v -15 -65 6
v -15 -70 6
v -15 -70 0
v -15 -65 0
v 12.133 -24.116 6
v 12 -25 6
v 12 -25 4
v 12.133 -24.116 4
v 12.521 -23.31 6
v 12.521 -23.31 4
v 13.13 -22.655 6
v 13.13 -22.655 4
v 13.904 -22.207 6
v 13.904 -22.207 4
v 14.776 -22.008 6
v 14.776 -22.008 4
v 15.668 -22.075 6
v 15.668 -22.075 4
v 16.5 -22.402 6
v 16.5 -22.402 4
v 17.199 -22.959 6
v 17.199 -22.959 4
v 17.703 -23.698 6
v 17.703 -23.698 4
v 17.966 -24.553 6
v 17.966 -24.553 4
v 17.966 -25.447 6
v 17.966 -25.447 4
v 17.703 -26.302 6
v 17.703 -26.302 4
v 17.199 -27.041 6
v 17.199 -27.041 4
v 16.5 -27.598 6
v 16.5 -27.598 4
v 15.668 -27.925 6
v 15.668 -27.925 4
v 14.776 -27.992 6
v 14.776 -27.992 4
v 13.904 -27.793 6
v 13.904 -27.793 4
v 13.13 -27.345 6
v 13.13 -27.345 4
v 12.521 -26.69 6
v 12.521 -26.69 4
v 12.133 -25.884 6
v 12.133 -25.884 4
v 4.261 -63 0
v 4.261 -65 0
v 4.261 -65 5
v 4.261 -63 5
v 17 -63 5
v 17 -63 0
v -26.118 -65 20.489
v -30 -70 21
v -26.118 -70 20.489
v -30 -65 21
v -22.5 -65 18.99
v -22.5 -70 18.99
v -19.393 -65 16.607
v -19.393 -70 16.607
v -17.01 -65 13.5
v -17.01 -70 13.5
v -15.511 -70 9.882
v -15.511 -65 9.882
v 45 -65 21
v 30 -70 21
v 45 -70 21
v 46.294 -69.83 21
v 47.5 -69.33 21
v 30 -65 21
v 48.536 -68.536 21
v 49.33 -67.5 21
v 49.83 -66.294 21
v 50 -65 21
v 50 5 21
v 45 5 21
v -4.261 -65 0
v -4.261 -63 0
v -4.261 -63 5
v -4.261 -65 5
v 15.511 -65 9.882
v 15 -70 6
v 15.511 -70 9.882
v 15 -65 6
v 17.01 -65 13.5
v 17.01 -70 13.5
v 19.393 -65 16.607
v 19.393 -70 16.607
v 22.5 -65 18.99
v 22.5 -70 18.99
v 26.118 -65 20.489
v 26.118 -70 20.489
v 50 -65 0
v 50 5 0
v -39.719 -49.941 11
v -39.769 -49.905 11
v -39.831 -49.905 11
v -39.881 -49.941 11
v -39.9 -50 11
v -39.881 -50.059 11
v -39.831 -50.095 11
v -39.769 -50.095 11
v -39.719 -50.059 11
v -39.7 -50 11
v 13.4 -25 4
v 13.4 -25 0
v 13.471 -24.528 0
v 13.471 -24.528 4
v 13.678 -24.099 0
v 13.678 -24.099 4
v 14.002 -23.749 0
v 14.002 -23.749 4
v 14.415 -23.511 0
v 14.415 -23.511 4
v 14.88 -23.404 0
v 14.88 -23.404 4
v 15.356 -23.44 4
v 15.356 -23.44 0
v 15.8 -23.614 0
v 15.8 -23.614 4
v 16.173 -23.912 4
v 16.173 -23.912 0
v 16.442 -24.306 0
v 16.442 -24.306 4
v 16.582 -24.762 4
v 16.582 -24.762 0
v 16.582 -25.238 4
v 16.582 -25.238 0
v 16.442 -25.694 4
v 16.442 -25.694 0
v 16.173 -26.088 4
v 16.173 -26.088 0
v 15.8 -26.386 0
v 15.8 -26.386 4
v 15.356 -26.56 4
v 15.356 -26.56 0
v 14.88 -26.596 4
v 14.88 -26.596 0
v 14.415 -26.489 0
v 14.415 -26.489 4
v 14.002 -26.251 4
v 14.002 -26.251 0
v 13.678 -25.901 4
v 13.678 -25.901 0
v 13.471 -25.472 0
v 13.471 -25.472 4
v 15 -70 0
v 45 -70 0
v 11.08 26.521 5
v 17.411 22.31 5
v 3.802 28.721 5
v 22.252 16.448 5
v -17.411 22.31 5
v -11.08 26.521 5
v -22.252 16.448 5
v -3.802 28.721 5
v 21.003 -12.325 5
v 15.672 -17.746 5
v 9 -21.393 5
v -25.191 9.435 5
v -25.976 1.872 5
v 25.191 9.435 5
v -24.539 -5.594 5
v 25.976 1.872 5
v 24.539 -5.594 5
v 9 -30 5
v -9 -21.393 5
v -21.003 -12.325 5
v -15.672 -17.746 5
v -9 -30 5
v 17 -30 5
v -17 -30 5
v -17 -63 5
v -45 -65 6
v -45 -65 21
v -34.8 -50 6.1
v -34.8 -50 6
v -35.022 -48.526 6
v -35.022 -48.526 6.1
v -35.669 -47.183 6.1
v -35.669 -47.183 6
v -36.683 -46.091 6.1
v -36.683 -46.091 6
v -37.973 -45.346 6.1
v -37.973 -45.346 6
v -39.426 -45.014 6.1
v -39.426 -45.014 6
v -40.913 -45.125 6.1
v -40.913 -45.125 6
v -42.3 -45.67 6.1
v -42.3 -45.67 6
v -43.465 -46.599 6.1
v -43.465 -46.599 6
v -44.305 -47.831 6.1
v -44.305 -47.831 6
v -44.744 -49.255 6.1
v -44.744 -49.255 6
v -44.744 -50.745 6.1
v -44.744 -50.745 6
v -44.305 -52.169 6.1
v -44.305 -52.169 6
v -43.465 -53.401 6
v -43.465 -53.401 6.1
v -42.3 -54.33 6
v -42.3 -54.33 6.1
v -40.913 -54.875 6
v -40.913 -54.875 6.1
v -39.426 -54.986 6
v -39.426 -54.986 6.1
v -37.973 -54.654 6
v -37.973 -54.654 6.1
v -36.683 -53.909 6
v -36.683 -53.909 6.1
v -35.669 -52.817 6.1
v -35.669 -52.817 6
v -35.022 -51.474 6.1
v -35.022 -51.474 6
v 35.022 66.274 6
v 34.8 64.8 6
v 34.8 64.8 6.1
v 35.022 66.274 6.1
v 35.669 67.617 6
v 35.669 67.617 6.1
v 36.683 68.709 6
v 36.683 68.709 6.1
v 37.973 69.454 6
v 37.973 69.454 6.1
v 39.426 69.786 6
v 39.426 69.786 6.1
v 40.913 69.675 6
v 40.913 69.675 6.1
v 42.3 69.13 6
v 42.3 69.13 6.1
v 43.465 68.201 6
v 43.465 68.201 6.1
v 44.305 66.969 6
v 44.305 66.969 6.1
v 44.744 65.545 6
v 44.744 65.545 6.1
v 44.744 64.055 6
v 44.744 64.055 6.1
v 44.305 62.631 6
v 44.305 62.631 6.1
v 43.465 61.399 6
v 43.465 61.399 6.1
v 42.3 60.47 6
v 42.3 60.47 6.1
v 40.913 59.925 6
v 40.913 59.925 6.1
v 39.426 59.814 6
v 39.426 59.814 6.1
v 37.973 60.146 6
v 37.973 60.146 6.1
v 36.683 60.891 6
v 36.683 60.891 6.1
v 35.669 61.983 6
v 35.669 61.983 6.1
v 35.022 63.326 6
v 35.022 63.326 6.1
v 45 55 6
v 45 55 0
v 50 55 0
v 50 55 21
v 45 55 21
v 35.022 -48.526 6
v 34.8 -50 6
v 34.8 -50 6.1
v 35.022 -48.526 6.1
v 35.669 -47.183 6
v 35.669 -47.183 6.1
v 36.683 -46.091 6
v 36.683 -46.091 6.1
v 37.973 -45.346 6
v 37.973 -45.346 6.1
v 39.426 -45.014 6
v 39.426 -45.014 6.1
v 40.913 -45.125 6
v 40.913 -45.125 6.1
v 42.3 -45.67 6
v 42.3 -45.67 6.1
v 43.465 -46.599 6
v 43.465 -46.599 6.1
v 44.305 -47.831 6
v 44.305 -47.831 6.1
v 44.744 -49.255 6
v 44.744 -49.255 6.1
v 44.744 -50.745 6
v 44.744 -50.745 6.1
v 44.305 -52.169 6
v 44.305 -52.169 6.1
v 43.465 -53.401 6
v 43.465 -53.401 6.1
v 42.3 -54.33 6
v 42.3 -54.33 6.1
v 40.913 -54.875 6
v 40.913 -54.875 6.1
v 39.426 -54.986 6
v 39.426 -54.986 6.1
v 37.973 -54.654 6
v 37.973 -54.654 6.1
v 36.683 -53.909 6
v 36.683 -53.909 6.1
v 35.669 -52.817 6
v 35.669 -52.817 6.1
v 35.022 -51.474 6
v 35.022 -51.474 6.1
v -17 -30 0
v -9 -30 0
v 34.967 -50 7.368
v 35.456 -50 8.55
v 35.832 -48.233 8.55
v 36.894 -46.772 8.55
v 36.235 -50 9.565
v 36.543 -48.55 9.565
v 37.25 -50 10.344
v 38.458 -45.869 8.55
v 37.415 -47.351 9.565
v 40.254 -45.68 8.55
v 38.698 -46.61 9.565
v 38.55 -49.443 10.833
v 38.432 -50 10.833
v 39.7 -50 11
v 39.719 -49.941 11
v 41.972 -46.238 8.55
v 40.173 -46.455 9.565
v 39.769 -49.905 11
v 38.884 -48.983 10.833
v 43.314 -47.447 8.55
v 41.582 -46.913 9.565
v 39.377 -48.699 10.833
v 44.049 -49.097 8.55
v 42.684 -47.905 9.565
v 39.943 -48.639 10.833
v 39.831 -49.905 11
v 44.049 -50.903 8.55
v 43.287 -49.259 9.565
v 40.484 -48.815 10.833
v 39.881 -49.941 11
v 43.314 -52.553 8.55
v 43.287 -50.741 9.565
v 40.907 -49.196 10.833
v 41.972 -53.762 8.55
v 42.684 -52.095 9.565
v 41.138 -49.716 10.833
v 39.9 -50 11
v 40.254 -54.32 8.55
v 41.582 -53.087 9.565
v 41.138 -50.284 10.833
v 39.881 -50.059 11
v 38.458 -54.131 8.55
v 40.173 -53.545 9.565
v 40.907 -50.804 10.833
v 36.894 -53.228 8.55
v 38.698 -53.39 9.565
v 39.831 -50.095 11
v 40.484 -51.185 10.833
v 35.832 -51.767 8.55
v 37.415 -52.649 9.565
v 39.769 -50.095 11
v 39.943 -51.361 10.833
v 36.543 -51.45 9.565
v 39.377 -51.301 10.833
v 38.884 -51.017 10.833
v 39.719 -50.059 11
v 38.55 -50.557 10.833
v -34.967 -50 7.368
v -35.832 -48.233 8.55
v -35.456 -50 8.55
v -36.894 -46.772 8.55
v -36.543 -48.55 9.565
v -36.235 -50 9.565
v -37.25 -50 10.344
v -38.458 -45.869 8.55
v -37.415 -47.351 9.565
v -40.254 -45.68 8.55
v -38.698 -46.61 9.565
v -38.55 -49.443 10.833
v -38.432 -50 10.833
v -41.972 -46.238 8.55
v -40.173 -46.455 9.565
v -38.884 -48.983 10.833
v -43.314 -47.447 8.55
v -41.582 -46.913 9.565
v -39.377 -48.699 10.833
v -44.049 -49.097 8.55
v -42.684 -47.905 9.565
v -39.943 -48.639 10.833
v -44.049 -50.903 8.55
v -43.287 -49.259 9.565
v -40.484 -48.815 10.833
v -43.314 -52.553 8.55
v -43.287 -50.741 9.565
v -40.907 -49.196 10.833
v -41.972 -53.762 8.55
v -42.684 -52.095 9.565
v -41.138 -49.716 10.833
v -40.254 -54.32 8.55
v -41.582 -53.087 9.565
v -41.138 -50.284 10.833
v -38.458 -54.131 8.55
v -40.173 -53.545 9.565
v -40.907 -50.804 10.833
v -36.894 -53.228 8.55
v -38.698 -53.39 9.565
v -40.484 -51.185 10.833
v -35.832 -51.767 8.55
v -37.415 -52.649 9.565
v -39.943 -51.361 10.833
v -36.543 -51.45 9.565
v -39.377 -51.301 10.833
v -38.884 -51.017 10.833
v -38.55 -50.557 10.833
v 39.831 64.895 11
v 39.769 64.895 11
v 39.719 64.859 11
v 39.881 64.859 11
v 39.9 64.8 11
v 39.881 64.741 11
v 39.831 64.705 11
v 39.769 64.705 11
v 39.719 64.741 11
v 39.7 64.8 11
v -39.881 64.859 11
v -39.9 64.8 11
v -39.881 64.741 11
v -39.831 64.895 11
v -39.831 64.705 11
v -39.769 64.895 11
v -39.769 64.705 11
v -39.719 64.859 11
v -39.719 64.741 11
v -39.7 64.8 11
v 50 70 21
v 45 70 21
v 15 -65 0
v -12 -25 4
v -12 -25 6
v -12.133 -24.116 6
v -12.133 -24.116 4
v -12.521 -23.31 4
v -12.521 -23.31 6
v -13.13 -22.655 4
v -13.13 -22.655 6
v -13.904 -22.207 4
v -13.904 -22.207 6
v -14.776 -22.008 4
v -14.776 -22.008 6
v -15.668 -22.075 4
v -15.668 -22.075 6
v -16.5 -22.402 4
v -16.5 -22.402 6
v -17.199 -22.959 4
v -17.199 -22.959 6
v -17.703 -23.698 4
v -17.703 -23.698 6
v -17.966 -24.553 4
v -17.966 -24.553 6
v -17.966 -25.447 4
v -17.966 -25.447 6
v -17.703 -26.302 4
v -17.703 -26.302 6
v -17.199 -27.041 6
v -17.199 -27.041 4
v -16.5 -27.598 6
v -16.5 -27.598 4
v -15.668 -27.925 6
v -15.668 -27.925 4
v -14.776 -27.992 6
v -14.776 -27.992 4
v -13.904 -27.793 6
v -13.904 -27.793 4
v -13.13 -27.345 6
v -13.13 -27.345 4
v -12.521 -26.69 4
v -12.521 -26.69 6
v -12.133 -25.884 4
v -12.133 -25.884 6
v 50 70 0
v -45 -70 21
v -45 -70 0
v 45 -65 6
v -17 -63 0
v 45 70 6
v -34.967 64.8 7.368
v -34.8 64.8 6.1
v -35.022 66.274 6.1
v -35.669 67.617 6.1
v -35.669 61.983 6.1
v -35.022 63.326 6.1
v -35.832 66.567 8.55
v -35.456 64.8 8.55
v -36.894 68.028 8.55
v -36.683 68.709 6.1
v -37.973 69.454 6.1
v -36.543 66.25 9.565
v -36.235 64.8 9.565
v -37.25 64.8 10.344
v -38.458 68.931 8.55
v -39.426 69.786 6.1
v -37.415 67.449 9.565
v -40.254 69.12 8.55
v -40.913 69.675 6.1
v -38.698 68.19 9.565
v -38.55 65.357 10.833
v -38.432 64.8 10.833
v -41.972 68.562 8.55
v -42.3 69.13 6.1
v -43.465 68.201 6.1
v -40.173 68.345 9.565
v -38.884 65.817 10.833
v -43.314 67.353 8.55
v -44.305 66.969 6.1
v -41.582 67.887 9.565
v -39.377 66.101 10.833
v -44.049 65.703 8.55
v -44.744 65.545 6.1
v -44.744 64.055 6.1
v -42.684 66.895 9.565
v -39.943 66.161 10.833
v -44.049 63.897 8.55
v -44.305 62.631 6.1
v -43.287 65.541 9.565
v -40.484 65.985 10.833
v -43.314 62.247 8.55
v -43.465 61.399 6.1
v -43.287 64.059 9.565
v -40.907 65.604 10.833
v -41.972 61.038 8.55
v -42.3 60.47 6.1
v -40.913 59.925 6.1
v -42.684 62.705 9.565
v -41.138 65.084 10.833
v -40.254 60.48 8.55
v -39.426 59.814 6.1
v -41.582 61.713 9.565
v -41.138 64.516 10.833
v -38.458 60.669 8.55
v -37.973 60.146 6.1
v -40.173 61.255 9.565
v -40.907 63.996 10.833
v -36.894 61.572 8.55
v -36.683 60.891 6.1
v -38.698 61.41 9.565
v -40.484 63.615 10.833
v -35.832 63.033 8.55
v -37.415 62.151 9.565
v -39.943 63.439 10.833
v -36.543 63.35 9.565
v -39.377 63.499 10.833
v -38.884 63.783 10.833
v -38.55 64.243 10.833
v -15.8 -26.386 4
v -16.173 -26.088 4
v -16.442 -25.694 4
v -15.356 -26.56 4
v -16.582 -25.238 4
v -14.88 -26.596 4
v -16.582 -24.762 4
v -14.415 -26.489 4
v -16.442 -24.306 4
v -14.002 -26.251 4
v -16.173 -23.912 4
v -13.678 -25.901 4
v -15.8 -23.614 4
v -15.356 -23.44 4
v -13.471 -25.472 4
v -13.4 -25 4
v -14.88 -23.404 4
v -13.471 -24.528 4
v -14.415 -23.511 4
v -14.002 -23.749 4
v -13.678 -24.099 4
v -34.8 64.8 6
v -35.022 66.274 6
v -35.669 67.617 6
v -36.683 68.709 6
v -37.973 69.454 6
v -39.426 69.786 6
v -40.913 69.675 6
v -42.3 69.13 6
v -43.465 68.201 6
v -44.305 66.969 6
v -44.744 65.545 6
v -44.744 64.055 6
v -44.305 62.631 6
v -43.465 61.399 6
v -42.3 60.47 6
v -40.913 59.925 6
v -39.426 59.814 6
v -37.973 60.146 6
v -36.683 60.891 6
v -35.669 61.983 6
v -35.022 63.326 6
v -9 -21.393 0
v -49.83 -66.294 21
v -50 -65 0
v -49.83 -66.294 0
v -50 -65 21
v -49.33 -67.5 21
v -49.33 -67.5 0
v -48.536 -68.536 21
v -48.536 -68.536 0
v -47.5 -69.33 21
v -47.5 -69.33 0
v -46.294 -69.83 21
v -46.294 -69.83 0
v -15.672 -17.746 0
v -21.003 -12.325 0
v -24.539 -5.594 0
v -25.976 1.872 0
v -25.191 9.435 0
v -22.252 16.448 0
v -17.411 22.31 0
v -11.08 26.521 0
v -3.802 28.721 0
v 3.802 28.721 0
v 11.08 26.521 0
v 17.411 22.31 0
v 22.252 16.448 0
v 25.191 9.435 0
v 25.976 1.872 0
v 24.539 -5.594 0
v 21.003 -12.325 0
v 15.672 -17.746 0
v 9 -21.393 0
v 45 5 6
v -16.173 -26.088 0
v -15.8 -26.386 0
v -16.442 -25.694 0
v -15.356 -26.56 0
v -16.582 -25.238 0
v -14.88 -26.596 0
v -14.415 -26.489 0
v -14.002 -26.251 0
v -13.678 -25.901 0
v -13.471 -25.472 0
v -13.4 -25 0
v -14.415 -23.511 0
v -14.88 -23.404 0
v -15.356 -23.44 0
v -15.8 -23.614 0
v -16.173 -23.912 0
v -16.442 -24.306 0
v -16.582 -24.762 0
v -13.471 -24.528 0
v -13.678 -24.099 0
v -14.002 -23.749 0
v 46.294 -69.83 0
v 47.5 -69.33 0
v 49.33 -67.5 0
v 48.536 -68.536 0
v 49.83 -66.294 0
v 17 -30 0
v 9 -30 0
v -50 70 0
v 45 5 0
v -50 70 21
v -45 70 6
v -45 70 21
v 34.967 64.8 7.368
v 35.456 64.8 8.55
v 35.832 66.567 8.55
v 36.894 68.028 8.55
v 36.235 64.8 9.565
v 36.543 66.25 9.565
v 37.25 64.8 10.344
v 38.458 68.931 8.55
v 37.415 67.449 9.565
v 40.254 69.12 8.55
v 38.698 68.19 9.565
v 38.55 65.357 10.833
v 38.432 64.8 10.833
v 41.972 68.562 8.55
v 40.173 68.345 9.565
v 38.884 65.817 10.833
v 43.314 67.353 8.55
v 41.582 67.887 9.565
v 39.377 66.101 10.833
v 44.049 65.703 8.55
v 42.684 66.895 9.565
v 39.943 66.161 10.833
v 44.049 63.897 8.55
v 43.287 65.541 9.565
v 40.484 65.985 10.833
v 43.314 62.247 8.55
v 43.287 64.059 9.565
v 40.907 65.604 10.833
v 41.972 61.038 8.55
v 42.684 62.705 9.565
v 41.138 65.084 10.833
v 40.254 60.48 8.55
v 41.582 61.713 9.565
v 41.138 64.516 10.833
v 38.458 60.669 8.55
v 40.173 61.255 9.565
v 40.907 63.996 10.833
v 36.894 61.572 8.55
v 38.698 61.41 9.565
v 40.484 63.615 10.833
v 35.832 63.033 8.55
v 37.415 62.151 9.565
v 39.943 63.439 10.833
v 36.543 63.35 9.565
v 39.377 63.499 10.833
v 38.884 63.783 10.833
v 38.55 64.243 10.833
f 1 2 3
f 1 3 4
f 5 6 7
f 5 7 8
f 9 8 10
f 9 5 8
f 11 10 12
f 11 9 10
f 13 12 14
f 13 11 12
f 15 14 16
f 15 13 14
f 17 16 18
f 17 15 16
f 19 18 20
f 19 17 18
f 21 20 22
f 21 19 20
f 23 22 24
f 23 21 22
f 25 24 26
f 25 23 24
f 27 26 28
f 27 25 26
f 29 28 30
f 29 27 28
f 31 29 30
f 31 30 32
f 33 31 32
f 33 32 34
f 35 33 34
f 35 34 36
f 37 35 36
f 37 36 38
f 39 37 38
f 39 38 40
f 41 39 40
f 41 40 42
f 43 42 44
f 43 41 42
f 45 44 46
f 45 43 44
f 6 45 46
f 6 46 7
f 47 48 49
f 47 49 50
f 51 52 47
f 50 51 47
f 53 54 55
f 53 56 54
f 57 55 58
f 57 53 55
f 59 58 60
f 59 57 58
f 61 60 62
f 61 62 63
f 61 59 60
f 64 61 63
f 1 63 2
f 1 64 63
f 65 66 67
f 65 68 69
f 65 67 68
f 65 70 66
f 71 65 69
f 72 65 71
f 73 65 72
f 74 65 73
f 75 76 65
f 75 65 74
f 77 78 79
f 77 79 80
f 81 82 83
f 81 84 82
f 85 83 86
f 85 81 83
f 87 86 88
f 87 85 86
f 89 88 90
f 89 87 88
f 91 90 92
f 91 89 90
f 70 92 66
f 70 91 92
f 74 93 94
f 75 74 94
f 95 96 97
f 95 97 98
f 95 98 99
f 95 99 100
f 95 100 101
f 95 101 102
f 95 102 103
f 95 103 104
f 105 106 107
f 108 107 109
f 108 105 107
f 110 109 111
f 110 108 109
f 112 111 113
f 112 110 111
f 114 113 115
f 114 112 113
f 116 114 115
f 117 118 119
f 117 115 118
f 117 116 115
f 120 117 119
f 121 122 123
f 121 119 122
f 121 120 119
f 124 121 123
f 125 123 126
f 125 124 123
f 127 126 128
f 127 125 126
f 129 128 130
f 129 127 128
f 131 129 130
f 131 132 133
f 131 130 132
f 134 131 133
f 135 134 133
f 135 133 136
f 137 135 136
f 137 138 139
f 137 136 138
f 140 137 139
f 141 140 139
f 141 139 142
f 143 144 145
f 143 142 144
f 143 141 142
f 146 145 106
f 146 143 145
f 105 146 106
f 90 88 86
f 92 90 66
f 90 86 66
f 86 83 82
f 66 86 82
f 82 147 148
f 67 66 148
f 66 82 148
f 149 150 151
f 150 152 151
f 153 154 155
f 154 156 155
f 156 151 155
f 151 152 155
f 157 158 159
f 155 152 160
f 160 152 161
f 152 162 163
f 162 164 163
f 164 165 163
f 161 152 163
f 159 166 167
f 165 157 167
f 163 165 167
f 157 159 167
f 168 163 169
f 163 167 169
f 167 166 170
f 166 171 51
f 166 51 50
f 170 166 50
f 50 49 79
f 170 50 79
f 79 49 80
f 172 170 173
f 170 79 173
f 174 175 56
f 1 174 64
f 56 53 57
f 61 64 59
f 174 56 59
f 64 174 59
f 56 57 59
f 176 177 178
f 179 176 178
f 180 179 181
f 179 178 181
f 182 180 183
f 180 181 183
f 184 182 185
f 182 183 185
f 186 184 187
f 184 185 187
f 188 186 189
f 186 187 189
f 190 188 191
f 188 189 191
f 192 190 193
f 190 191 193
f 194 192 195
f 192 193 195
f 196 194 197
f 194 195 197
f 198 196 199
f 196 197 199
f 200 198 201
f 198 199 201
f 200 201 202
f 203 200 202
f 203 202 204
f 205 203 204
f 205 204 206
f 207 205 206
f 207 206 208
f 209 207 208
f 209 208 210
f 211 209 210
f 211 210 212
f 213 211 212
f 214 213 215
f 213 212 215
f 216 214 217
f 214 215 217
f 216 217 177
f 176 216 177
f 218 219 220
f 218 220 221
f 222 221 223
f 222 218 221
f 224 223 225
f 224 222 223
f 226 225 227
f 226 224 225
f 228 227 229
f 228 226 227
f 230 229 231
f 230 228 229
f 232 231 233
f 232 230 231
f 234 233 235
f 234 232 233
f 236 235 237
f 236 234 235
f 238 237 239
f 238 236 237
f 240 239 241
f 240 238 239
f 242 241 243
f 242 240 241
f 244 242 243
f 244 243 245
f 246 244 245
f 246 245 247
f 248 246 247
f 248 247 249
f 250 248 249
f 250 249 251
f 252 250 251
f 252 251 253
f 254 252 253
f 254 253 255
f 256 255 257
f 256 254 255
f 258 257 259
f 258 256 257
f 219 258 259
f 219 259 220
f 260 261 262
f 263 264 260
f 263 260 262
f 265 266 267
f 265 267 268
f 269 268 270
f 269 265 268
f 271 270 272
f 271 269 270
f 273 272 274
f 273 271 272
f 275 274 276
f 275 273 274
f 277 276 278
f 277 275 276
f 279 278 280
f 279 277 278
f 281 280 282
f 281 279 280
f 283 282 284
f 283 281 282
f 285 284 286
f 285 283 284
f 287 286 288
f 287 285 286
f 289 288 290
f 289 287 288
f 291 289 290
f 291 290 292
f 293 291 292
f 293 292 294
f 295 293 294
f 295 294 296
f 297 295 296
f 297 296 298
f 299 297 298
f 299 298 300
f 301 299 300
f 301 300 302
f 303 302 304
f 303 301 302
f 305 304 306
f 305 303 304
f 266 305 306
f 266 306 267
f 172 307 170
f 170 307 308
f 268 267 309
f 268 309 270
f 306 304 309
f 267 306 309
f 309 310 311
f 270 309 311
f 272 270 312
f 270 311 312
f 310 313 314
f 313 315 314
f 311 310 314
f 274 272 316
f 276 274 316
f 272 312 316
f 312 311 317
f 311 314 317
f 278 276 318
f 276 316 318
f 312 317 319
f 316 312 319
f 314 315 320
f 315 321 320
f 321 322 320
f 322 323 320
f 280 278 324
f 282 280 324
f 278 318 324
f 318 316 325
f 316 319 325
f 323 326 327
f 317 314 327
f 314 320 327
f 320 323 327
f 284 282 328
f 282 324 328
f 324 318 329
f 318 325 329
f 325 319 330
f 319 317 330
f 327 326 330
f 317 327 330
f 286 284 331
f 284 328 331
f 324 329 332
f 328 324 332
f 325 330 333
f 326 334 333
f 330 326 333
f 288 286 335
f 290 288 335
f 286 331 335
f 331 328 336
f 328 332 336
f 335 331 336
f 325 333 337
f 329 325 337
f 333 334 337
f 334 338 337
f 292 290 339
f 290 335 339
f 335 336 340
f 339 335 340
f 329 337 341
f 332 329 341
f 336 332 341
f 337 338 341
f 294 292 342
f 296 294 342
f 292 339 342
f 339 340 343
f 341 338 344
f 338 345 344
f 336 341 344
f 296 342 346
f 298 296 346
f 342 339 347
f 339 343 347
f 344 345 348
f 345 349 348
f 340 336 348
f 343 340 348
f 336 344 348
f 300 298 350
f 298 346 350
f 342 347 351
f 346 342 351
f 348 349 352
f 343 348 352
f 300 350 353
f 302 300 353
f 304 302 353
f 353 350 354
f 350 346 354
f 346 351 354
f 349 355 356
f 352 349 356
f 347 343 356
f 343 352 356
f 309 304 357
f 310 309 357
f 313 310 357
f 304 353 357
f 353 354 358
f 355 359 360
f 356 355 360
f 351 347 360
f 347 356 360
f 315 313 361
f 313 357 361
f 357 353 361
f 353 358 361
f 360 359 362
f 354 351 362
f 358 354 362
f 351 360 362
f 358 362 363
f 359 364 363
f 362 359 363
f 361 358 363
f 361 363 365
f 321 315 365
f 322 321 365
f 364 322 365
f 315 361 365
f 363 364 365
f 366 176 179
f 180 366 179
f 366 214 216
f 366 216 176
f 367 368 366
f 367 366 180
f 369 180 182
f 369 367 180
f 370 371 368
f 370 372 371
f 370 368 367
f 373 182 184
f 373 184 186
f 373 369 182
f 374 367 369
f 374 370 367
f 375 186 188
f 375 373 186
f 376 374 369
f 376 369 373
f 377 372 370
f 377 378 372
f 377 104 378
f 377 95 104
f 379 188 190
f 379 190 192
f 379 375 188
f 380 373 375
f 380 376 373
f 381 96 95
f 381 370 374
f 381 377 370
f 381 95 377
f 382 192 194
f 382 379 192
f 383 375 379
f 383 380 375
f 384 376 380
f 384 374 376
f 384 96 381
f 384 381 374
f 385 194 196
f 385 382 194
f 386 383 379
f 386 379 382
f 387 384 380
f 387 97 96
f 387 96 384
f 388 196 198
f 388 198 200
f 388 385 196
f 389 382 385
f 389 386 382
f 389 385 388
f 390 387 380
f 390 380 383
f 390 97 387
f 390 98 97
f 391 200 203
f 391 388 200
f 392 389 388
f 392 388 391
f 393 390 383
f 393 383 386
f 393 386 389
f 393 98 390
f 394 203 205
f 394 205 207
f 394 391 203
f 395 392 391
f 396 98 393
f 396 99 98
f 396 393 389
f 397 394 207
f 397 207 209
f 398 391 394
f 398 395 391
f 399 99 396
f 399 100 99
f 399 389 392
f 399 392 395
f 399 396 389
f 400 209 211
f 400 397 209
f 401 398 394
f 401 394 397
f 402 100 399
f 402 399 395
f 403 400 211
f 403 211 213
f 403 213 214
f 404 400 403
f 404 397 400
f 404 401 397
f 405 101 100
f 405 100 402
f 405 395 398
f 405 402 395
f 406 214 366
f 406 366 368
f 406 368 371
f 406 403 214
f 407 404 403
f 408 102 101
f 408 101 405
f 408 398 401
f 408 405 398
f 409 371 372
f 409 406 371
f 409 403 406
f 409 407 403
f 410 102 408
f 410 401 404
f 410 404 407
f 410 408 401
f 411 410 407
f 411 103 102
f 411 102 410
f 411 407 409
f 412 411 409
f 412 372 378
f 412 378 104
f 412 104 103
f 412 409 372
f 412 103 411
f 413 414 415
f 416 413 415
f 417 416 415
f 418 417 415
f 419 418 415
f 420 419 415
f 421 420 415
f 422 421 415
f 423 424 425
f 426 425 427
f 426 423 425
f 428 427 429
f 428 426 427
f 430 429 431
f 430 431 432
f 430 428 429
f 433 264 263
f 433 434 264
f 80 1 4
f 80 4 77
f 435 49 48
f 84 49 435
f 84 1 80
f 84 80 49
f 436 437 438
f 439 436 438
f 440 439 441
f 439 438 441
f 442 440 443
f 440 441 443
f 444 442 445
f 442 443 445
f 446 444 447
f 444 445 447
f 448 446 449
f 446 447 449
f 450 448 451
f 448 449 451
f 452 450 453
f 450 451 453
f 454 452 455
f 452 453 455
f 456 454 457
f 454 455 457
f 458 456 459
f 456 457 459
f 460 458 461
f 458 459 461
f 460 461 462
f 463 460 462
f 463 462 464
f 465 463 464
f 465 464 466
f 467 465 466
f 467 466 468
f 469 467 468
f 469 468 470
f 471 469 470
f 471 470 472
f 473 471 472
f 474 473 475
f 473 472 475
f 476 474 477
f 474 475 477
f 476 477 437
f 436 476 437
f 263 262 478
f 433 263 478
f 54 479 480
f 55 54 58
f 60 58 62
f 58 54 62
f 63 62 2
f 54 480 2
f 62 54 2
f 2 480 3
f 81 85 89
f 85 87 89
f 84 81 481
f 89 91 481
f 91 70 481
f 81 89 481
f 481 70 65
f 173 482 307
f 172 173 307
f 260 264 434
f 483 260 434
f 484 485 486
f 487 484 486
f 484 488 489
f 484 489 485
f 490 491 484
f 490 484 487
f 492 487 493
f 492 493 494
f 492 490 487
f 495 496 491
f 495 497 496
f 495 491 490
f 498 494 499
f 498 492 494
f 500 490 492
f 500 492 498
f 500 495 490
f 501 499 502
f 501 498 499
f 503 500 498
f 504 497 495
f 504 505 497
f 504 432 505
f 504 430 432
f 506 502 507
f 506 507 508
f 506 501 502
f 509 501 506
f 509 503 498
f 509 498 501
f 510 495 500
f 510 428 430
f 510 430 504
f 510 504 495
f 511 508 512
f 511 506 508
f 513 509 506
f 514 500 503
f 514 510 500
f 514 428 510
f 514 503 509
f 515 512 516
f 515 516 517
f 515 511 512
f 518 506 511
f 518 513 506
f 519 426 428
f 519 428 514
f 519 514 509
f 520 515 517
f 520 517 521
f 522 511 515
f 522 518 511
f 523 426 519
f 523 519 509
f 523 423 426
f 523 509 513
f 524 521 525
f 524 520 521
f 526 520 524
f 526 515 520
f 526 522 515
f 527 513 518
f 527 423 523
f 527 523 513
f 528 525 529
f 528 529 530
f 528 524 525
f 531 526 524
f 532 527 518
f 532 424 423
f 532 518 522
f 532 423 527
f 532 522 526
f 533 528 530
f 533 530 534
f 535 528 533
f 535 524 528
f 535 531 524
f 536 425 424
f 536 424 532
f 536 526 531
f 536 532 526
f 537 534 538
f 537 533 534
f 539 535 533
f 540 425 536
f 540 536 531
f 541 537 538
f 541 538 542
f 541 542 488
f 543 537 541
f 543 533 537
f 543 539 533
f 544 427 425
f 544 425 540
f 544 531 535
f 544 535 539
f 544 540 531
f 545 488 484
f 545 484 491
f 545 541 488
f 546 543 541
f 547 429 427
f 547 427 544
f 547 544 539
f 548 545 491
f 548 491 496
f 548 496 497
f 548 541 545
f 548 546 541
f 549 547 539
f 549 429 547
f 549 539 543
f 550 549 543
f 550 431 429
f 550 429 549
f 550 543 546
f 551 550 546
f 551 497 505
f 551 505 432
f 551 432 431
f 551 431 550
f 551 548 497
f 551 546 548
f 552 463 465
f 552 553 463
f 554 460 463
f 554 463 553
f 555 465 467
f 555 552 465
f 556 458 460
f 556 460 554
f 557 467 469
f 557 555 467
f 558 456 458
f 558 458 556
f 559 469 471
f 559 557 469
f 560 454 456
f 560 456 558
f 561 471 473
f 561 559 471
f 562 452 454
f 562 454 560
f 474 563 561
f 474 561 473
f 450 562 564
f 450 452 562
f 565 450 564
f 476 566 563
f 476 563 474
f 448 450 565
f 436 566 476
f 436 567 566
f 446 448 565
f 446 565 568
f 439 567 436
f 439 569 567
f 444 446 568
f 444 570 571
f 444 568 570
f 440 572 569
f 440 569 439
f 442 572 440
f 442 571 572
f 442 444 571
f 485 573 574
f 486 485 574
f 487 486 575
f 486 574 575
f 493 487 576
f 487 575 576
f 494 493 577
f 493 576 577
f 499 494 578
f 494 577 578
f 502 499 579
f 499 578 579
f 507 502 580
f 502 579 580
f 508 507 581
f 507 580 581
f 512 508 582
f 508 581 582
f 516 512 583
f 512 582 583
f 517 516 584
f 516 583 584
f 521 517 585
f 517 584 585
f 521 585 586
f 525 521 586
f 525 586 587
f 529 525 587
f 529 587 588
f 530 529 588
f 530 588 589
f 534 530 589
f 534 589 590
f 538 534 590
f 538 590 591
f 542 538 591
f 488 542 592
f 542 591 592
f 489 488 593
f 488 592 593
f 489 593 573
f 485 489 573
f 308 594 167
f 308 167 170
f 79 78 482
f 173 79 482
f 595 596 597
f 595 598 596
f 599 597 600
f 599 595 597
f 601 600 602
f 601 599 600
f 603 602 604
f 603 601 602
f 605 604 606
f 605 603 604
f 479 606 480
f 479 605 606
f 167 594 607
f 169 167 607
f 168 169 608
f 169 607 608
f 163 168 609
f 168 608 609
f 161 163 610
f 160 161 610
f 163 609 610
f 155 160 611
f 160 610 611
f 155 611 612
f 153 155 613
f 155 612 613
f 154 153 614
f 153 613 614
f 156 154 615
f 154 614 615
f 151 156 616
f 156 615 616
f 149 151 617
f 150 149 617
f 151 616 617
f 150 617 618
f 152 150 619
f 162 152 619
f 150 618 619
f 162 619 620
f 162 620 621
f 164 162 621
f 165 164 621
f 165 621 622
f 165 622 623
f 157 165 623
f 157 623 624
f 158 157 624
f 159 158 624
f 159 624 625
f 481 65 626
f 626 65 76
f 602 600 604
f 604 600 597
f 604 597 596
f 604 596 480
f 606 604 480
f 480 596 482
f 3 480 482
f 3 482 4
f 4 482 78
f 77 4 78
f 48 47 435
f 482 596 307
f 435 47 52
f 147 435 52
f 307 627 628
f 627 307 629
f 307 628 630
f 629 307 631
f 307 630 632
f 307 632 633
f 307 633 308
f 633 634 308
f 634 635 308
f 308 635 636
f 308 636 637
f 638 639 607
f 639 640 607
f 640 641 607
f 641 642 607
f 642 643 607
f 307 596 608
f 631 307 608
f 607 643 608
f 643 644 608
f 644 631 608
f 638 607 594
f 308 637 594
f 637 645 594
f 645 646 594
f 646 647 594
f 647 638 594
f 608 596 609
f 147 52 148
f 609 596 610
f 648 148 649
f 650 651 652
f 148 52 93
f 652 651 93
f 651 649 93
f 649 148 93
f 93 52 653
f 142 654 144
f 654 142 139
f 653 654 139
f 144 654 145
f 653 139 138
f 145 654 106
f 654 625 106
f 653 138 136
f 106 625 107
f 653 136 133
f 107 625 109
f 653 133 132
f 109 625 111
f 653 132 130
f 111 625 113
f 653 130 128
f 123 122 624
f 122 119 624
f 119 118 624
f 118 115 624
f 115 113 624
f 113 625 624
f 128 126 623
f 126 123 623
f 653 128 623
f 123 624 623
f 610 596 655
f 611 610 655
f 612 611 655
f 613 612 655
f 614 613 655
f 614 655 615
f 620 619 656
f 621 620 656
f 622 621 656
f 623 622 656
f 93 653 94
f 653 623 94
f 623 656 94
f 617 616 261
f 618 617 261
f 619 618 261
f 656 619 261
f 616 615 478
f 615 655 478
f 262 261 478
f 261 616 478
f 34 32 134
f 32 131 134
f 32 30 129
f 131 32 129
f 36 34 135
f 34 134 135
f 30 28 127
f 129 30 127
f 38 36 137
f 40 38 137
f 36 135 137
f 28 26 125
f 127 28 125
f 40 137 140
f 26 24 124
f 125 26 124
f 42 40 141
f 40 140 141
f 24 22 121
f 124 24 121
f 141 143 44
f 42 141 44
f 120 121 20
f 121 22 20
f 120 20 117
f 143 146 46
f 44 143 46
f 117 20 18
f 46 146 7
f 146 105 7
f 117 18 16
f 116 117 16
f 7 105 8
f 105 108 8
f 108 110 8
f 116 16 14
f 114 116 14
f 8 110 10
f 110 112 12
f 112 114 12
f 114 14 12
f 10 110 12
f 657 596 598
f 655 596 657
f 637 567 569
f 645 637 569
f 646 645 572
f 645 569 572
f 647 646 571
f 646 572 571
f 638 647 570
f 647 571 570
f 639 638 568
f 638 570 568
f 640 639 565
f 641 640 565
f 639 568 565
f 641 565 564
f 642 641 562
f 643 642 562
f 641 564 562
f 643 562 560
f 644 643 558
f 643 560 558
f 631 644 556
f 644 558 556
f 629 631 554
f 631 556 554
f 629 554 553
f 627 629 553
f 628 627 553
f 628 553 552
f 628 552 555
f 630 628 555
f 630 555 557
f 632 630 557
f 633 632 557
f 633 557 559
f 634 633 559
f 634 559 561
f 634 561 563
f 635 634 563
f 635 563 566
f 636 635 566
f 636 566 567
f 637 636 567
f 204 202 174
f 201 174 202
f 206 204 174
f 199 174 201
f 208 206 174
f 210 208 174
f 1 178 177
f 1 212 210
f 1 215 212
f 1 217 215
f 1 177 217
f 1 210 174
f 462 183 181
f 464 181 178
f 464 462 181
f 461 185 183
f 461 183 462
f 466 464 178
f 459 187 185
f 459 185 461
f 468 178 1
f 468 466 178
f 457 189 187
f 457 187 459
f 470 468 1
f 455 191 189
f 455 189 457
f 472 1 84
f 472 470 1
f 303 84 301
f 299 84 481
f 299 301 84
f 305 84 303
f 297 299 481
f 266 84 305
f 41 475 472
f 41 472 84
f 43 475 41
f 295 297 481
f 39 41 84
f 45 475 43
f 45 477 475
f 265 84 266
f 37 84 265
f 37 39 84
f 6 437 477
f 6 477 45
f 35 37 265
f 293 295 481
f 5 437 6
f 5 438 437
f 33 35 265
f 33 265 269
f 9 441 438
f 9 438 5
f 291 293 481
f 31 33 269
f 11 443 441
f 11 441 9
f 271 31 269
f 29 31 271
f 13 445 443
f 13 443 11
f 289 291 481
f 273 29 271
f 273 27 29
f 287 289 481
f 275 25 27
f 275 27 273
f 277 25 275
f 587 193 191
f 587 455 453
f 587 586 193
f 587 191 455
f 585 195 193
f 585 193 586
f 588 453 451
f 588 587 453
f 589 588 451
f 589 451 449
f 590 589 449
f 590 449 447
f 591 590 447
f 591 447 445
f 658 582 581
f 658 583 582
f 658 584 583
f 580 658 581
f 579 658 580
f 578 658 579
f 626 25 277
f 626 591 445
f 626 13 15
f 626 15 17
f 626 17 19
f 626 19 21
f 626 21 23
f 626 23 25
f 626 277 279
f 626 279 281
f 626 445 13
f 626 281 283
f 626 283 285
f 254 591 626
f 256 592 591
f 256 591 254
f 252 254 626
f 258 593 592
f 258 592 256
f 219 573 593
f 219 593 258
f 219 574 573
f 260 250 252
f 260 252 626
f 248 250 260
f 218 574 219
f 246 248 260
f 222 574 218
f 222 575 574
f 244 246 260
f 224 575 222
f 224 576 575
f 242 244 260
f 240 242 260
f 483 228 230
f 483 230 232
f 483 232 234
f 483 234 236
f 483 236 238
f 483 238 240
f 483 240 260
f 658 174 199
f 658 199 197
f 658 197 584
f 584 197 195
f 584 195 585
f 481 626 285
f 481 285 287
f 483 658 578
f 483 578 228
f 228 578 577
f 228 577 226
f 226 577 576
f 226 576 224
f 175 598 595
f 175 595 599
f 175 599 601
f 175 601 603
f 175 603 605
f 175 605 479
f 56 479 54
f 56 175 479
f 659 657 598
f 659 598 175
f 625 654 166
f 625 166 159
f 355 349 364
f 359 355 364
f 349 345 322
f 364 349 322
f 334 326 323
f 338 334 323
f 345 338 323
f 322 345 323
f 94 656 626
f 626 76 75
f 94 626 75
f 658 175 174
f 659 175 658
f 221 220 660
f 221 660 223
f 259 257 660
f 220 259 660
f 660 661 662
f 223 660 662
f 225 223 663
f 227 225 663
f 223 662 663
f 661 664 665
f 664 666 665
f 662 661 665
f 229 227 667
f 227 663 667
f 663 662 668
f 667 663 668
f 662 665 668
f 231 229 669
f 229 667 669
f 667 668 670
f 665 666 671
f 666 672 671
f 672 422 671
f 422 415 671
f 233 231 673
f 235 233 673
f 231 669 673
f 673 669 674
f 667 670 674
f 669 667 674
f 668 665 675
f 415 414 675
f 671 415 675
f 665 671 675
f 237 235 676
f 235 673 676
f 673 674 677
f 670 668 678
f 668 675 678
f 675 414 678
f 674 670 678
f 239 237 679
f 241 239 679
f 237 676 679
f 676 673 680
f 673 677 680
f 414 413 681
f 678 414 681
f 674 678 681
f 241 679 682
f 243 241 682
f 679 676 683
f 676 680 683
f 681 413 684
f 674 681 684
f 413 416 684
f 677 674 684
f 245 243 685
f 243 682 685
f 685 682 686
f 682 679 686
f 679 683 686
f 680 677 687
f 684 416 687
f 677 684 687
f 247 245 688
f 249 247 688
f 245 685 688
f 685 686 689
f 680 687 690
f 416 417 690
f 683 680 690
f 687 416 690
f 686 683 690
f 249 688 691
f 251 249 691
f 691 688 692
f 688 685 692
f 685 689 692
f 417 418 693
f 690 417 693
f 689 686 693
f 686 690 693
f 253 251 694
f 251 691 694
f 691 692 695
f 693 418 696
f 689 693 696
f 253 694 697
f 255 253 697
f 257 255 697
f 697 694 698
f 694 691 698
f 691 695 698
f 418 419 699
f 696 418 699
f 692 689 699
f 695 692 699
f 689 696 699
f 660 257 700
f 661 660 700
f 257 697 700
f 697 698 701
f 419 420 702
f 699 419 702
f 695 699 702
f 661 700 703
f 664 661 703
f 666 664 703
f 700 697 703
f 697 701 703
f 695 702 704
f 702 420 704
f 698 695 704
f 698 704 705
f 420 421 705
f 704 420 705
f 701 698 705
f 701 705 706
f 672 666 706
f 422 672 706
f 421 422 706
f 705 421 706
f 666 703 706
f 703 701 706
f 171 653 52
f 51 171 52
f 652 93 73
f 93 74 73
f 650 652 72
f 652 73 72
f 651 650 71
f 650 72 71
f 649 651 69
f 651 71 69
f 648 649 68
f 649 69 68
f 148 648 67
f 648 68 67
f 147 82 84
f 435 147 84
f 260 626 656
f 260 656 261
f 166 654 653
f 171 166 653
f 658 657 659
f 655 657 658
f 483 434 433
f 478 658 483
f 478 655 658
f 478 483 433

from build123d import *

# Parameters (mm, degrees)
SKETCH_W        = 100
SKETCH_H        = 140
PAD_DEPTH       = 21
SKETCH001_W     = 90
SKETCH001_H     = 135
POCKET_DEPTH    = 15
SKETCH003_R     = 3
POCKET001_DEPTH = 2
SKETCH004_R     = 1.6
POCKET002_DEPTH = 350.647794
SKETCH005_W     = 5
SKETCH005_H     = 50
POCKET003_DEPTH = 21.001
SKETCH006_W     = 30
SKETCH006_H     = 5
POCKET004_DEPTH = 21.001
FILLET_R        = 5
POCKET005_DEPTH = 5
FILLET001_R     = 15
SKETCH008_R     = 5
PAD001_DEPTH    = 5
FILLET002_R     = 4.9
SKETCH009_R     = 5
PAD002_DEPTH    = 5
FILLET003_R     = 4.9


with BuildPart() as part:
    # Sketch → Pad (new body)
    with BuildSketch(Plane.XY):
        Rectangle(SKETCH_W, SKETCH_H)
    extrude(amount=PAD_DEPTH)

    # Sketch001 → Pocket (cut)
    with BuildSketch(Plane.XY.offset(21)):
        with Locations((0, 2.5)):
            Rectangle(SKETCH001_W, SKETCH001_H)
    extrude(amount=-POCKET_DEPTH, mode=Mode.SUBTRACT)

    # Sketch003 → Pocket001 (cut)
    with BuildSketch(Plane.XY.offset(6)):
        with Locations((-15, -25)):
            Circle(SKETCH003_R)
    pocket001 = extrude(amount=-POCKET001_DEPTH, mode=Mode.SUBTRACT)

    # Sketch004 → Pocket002 (cut, through all)
    with BuildSketch(Plane.XY.offset(4)):
        with Locations((-15, -25)):
            Circle(SKETCH004_R)
    pocket002 = extrude(amount=-POCKET002_DEPTH, mode=Mode.SUBTRACT)

    # Mirrored: Pocket002, Pocket001 across Sketch004 V_Axis
    add(pocket002.mirror(Plane(origin=(0, 0, 4), x_dir=(0, 0, 1), z_dir=(1, 0, 0))), mode=Mode.SUBTRACT)
    add(pocket001.mirror(Plane(origin=(0, 0, 4), x_dir=(0, 0, 1), z_dir=(1, 0, 0))), mode=Mode.SUBTRACT)

    # Sketch005 → Pocket003 (cut, through all)
    with BuildSketch(Plane.XY.offset(21)):
        with Locations((47.5, 30)):
            Rectangle(SKETCH005_W, SKETCH005_H)
    extrude(amount=-POCKET003_DEPTH, mode=Mode.SUBTRACT)

    # Sketch006 → Pocket004 (cut, through all)
    with BuildSketch(Plane.XY.offset(21)):
        with Locations((0, -67.5)):
            Rectangle(SKETCH006_W, SKETCH006_H)
    extrude(amount=-POCKET004_DEPTH, mode=Mode.SUBTRACT)

    # Fillet
    fillet_edges = [part.edges().sort_by_distance(p)[0] for p in [
        (-50, -70, 10.5),
        (50, -70, 10.5),
    ]]
    fillet(fillet_edges, radius=FILLET_R)

    # Sketch007 → Pocket005 (cut)
    with BuildSketch(Plane(origin=(0, 0, 0), x_dir=(1, 0, 0), z_dir=(0, 0, -1))):
        with BuildLine():
            Line((9, 30), (9, 21.392622))
            ThreePointArc((-9, 21.392622), (0, -29), (9, 21.392622))
            Line((-9, 21.392622), (-9, 30))
            Line((-17, 30), (-9, 30))
            Line((-17, 63), (-17, 30))
            Line((-4.261222, 63), (-17, 63))
            Line((-4.261222, 63), (-4.261222, 65))
            Line((-4.261222, 65), (4.261222, 65))
            Line((4.261222, 65), (4.261222, 63))
            Line((17, 63), (4.261222, 63))
            Line((17, 30), (17, 63))
            Line((9, 30), (17, 30))
        make_face()
    extrude(amount=-POCKET005_DEPTH, mode=Mode.SUBTRACT)

    # Fillet001
    fillet001_edges = [part.edges().sort_by_distance(p)[0] for p in [
        (-15, -67.5, 21),
        (15, -67.5, 21),
    ]]
    fillet(fillet001_edges, radius=FILLET001_R)

    # Sketch008 → Pad001 (new body)
    with BuildSketch(Plane.XY.offset(6)):
        with Locations((-39.8, 64.8)):
            Circle(SKETCH008_R)
    pad001 = extrude(amount=PAD001_DEPTH)

    # Mirrored001: Pad001 across Sketch008 V_Axis
    add(pad001.mirror(Plane(origin=(0, 0, 6), x_dir=(0, 0, 1), z_dir=(1, 0, 0))))

    # Fillet002
    fillet002_edges = [part.edges().sort_by_distance(p)[0] for p in [
        (-44.8, 64.8, 11),
        (44.8, 64.8, 11),
    ]]
    fillet(fillet002_edges, radius=FILLET002_R)

    # Sketch009 → Pad002 (new body)
    with BuildSketch(Plane.XY.offset(6)):
        with Locations((-39.8, -50)):
            Circle(SKETCH009_R)
    pad002 = extrude(amount=PAD002_DEPTH)

    # Mirrored002: Pad002 across Sketch009 V_Axis
    add(pad002.mirror(Plane(origin=(0, 0, 6), x_dir=(0, 0, 1), z_dir=(1, 0, 0))))

    # Fillet003
    fillet003_edges = [part.edges().sort_by_distance(p)[0] for p in [
        (-44.8, -50, 11),
        (44.8, -50, 11),
    ]]
    fillet(fillet003_edges, radius=FILLET003_R)


solid = part.part
